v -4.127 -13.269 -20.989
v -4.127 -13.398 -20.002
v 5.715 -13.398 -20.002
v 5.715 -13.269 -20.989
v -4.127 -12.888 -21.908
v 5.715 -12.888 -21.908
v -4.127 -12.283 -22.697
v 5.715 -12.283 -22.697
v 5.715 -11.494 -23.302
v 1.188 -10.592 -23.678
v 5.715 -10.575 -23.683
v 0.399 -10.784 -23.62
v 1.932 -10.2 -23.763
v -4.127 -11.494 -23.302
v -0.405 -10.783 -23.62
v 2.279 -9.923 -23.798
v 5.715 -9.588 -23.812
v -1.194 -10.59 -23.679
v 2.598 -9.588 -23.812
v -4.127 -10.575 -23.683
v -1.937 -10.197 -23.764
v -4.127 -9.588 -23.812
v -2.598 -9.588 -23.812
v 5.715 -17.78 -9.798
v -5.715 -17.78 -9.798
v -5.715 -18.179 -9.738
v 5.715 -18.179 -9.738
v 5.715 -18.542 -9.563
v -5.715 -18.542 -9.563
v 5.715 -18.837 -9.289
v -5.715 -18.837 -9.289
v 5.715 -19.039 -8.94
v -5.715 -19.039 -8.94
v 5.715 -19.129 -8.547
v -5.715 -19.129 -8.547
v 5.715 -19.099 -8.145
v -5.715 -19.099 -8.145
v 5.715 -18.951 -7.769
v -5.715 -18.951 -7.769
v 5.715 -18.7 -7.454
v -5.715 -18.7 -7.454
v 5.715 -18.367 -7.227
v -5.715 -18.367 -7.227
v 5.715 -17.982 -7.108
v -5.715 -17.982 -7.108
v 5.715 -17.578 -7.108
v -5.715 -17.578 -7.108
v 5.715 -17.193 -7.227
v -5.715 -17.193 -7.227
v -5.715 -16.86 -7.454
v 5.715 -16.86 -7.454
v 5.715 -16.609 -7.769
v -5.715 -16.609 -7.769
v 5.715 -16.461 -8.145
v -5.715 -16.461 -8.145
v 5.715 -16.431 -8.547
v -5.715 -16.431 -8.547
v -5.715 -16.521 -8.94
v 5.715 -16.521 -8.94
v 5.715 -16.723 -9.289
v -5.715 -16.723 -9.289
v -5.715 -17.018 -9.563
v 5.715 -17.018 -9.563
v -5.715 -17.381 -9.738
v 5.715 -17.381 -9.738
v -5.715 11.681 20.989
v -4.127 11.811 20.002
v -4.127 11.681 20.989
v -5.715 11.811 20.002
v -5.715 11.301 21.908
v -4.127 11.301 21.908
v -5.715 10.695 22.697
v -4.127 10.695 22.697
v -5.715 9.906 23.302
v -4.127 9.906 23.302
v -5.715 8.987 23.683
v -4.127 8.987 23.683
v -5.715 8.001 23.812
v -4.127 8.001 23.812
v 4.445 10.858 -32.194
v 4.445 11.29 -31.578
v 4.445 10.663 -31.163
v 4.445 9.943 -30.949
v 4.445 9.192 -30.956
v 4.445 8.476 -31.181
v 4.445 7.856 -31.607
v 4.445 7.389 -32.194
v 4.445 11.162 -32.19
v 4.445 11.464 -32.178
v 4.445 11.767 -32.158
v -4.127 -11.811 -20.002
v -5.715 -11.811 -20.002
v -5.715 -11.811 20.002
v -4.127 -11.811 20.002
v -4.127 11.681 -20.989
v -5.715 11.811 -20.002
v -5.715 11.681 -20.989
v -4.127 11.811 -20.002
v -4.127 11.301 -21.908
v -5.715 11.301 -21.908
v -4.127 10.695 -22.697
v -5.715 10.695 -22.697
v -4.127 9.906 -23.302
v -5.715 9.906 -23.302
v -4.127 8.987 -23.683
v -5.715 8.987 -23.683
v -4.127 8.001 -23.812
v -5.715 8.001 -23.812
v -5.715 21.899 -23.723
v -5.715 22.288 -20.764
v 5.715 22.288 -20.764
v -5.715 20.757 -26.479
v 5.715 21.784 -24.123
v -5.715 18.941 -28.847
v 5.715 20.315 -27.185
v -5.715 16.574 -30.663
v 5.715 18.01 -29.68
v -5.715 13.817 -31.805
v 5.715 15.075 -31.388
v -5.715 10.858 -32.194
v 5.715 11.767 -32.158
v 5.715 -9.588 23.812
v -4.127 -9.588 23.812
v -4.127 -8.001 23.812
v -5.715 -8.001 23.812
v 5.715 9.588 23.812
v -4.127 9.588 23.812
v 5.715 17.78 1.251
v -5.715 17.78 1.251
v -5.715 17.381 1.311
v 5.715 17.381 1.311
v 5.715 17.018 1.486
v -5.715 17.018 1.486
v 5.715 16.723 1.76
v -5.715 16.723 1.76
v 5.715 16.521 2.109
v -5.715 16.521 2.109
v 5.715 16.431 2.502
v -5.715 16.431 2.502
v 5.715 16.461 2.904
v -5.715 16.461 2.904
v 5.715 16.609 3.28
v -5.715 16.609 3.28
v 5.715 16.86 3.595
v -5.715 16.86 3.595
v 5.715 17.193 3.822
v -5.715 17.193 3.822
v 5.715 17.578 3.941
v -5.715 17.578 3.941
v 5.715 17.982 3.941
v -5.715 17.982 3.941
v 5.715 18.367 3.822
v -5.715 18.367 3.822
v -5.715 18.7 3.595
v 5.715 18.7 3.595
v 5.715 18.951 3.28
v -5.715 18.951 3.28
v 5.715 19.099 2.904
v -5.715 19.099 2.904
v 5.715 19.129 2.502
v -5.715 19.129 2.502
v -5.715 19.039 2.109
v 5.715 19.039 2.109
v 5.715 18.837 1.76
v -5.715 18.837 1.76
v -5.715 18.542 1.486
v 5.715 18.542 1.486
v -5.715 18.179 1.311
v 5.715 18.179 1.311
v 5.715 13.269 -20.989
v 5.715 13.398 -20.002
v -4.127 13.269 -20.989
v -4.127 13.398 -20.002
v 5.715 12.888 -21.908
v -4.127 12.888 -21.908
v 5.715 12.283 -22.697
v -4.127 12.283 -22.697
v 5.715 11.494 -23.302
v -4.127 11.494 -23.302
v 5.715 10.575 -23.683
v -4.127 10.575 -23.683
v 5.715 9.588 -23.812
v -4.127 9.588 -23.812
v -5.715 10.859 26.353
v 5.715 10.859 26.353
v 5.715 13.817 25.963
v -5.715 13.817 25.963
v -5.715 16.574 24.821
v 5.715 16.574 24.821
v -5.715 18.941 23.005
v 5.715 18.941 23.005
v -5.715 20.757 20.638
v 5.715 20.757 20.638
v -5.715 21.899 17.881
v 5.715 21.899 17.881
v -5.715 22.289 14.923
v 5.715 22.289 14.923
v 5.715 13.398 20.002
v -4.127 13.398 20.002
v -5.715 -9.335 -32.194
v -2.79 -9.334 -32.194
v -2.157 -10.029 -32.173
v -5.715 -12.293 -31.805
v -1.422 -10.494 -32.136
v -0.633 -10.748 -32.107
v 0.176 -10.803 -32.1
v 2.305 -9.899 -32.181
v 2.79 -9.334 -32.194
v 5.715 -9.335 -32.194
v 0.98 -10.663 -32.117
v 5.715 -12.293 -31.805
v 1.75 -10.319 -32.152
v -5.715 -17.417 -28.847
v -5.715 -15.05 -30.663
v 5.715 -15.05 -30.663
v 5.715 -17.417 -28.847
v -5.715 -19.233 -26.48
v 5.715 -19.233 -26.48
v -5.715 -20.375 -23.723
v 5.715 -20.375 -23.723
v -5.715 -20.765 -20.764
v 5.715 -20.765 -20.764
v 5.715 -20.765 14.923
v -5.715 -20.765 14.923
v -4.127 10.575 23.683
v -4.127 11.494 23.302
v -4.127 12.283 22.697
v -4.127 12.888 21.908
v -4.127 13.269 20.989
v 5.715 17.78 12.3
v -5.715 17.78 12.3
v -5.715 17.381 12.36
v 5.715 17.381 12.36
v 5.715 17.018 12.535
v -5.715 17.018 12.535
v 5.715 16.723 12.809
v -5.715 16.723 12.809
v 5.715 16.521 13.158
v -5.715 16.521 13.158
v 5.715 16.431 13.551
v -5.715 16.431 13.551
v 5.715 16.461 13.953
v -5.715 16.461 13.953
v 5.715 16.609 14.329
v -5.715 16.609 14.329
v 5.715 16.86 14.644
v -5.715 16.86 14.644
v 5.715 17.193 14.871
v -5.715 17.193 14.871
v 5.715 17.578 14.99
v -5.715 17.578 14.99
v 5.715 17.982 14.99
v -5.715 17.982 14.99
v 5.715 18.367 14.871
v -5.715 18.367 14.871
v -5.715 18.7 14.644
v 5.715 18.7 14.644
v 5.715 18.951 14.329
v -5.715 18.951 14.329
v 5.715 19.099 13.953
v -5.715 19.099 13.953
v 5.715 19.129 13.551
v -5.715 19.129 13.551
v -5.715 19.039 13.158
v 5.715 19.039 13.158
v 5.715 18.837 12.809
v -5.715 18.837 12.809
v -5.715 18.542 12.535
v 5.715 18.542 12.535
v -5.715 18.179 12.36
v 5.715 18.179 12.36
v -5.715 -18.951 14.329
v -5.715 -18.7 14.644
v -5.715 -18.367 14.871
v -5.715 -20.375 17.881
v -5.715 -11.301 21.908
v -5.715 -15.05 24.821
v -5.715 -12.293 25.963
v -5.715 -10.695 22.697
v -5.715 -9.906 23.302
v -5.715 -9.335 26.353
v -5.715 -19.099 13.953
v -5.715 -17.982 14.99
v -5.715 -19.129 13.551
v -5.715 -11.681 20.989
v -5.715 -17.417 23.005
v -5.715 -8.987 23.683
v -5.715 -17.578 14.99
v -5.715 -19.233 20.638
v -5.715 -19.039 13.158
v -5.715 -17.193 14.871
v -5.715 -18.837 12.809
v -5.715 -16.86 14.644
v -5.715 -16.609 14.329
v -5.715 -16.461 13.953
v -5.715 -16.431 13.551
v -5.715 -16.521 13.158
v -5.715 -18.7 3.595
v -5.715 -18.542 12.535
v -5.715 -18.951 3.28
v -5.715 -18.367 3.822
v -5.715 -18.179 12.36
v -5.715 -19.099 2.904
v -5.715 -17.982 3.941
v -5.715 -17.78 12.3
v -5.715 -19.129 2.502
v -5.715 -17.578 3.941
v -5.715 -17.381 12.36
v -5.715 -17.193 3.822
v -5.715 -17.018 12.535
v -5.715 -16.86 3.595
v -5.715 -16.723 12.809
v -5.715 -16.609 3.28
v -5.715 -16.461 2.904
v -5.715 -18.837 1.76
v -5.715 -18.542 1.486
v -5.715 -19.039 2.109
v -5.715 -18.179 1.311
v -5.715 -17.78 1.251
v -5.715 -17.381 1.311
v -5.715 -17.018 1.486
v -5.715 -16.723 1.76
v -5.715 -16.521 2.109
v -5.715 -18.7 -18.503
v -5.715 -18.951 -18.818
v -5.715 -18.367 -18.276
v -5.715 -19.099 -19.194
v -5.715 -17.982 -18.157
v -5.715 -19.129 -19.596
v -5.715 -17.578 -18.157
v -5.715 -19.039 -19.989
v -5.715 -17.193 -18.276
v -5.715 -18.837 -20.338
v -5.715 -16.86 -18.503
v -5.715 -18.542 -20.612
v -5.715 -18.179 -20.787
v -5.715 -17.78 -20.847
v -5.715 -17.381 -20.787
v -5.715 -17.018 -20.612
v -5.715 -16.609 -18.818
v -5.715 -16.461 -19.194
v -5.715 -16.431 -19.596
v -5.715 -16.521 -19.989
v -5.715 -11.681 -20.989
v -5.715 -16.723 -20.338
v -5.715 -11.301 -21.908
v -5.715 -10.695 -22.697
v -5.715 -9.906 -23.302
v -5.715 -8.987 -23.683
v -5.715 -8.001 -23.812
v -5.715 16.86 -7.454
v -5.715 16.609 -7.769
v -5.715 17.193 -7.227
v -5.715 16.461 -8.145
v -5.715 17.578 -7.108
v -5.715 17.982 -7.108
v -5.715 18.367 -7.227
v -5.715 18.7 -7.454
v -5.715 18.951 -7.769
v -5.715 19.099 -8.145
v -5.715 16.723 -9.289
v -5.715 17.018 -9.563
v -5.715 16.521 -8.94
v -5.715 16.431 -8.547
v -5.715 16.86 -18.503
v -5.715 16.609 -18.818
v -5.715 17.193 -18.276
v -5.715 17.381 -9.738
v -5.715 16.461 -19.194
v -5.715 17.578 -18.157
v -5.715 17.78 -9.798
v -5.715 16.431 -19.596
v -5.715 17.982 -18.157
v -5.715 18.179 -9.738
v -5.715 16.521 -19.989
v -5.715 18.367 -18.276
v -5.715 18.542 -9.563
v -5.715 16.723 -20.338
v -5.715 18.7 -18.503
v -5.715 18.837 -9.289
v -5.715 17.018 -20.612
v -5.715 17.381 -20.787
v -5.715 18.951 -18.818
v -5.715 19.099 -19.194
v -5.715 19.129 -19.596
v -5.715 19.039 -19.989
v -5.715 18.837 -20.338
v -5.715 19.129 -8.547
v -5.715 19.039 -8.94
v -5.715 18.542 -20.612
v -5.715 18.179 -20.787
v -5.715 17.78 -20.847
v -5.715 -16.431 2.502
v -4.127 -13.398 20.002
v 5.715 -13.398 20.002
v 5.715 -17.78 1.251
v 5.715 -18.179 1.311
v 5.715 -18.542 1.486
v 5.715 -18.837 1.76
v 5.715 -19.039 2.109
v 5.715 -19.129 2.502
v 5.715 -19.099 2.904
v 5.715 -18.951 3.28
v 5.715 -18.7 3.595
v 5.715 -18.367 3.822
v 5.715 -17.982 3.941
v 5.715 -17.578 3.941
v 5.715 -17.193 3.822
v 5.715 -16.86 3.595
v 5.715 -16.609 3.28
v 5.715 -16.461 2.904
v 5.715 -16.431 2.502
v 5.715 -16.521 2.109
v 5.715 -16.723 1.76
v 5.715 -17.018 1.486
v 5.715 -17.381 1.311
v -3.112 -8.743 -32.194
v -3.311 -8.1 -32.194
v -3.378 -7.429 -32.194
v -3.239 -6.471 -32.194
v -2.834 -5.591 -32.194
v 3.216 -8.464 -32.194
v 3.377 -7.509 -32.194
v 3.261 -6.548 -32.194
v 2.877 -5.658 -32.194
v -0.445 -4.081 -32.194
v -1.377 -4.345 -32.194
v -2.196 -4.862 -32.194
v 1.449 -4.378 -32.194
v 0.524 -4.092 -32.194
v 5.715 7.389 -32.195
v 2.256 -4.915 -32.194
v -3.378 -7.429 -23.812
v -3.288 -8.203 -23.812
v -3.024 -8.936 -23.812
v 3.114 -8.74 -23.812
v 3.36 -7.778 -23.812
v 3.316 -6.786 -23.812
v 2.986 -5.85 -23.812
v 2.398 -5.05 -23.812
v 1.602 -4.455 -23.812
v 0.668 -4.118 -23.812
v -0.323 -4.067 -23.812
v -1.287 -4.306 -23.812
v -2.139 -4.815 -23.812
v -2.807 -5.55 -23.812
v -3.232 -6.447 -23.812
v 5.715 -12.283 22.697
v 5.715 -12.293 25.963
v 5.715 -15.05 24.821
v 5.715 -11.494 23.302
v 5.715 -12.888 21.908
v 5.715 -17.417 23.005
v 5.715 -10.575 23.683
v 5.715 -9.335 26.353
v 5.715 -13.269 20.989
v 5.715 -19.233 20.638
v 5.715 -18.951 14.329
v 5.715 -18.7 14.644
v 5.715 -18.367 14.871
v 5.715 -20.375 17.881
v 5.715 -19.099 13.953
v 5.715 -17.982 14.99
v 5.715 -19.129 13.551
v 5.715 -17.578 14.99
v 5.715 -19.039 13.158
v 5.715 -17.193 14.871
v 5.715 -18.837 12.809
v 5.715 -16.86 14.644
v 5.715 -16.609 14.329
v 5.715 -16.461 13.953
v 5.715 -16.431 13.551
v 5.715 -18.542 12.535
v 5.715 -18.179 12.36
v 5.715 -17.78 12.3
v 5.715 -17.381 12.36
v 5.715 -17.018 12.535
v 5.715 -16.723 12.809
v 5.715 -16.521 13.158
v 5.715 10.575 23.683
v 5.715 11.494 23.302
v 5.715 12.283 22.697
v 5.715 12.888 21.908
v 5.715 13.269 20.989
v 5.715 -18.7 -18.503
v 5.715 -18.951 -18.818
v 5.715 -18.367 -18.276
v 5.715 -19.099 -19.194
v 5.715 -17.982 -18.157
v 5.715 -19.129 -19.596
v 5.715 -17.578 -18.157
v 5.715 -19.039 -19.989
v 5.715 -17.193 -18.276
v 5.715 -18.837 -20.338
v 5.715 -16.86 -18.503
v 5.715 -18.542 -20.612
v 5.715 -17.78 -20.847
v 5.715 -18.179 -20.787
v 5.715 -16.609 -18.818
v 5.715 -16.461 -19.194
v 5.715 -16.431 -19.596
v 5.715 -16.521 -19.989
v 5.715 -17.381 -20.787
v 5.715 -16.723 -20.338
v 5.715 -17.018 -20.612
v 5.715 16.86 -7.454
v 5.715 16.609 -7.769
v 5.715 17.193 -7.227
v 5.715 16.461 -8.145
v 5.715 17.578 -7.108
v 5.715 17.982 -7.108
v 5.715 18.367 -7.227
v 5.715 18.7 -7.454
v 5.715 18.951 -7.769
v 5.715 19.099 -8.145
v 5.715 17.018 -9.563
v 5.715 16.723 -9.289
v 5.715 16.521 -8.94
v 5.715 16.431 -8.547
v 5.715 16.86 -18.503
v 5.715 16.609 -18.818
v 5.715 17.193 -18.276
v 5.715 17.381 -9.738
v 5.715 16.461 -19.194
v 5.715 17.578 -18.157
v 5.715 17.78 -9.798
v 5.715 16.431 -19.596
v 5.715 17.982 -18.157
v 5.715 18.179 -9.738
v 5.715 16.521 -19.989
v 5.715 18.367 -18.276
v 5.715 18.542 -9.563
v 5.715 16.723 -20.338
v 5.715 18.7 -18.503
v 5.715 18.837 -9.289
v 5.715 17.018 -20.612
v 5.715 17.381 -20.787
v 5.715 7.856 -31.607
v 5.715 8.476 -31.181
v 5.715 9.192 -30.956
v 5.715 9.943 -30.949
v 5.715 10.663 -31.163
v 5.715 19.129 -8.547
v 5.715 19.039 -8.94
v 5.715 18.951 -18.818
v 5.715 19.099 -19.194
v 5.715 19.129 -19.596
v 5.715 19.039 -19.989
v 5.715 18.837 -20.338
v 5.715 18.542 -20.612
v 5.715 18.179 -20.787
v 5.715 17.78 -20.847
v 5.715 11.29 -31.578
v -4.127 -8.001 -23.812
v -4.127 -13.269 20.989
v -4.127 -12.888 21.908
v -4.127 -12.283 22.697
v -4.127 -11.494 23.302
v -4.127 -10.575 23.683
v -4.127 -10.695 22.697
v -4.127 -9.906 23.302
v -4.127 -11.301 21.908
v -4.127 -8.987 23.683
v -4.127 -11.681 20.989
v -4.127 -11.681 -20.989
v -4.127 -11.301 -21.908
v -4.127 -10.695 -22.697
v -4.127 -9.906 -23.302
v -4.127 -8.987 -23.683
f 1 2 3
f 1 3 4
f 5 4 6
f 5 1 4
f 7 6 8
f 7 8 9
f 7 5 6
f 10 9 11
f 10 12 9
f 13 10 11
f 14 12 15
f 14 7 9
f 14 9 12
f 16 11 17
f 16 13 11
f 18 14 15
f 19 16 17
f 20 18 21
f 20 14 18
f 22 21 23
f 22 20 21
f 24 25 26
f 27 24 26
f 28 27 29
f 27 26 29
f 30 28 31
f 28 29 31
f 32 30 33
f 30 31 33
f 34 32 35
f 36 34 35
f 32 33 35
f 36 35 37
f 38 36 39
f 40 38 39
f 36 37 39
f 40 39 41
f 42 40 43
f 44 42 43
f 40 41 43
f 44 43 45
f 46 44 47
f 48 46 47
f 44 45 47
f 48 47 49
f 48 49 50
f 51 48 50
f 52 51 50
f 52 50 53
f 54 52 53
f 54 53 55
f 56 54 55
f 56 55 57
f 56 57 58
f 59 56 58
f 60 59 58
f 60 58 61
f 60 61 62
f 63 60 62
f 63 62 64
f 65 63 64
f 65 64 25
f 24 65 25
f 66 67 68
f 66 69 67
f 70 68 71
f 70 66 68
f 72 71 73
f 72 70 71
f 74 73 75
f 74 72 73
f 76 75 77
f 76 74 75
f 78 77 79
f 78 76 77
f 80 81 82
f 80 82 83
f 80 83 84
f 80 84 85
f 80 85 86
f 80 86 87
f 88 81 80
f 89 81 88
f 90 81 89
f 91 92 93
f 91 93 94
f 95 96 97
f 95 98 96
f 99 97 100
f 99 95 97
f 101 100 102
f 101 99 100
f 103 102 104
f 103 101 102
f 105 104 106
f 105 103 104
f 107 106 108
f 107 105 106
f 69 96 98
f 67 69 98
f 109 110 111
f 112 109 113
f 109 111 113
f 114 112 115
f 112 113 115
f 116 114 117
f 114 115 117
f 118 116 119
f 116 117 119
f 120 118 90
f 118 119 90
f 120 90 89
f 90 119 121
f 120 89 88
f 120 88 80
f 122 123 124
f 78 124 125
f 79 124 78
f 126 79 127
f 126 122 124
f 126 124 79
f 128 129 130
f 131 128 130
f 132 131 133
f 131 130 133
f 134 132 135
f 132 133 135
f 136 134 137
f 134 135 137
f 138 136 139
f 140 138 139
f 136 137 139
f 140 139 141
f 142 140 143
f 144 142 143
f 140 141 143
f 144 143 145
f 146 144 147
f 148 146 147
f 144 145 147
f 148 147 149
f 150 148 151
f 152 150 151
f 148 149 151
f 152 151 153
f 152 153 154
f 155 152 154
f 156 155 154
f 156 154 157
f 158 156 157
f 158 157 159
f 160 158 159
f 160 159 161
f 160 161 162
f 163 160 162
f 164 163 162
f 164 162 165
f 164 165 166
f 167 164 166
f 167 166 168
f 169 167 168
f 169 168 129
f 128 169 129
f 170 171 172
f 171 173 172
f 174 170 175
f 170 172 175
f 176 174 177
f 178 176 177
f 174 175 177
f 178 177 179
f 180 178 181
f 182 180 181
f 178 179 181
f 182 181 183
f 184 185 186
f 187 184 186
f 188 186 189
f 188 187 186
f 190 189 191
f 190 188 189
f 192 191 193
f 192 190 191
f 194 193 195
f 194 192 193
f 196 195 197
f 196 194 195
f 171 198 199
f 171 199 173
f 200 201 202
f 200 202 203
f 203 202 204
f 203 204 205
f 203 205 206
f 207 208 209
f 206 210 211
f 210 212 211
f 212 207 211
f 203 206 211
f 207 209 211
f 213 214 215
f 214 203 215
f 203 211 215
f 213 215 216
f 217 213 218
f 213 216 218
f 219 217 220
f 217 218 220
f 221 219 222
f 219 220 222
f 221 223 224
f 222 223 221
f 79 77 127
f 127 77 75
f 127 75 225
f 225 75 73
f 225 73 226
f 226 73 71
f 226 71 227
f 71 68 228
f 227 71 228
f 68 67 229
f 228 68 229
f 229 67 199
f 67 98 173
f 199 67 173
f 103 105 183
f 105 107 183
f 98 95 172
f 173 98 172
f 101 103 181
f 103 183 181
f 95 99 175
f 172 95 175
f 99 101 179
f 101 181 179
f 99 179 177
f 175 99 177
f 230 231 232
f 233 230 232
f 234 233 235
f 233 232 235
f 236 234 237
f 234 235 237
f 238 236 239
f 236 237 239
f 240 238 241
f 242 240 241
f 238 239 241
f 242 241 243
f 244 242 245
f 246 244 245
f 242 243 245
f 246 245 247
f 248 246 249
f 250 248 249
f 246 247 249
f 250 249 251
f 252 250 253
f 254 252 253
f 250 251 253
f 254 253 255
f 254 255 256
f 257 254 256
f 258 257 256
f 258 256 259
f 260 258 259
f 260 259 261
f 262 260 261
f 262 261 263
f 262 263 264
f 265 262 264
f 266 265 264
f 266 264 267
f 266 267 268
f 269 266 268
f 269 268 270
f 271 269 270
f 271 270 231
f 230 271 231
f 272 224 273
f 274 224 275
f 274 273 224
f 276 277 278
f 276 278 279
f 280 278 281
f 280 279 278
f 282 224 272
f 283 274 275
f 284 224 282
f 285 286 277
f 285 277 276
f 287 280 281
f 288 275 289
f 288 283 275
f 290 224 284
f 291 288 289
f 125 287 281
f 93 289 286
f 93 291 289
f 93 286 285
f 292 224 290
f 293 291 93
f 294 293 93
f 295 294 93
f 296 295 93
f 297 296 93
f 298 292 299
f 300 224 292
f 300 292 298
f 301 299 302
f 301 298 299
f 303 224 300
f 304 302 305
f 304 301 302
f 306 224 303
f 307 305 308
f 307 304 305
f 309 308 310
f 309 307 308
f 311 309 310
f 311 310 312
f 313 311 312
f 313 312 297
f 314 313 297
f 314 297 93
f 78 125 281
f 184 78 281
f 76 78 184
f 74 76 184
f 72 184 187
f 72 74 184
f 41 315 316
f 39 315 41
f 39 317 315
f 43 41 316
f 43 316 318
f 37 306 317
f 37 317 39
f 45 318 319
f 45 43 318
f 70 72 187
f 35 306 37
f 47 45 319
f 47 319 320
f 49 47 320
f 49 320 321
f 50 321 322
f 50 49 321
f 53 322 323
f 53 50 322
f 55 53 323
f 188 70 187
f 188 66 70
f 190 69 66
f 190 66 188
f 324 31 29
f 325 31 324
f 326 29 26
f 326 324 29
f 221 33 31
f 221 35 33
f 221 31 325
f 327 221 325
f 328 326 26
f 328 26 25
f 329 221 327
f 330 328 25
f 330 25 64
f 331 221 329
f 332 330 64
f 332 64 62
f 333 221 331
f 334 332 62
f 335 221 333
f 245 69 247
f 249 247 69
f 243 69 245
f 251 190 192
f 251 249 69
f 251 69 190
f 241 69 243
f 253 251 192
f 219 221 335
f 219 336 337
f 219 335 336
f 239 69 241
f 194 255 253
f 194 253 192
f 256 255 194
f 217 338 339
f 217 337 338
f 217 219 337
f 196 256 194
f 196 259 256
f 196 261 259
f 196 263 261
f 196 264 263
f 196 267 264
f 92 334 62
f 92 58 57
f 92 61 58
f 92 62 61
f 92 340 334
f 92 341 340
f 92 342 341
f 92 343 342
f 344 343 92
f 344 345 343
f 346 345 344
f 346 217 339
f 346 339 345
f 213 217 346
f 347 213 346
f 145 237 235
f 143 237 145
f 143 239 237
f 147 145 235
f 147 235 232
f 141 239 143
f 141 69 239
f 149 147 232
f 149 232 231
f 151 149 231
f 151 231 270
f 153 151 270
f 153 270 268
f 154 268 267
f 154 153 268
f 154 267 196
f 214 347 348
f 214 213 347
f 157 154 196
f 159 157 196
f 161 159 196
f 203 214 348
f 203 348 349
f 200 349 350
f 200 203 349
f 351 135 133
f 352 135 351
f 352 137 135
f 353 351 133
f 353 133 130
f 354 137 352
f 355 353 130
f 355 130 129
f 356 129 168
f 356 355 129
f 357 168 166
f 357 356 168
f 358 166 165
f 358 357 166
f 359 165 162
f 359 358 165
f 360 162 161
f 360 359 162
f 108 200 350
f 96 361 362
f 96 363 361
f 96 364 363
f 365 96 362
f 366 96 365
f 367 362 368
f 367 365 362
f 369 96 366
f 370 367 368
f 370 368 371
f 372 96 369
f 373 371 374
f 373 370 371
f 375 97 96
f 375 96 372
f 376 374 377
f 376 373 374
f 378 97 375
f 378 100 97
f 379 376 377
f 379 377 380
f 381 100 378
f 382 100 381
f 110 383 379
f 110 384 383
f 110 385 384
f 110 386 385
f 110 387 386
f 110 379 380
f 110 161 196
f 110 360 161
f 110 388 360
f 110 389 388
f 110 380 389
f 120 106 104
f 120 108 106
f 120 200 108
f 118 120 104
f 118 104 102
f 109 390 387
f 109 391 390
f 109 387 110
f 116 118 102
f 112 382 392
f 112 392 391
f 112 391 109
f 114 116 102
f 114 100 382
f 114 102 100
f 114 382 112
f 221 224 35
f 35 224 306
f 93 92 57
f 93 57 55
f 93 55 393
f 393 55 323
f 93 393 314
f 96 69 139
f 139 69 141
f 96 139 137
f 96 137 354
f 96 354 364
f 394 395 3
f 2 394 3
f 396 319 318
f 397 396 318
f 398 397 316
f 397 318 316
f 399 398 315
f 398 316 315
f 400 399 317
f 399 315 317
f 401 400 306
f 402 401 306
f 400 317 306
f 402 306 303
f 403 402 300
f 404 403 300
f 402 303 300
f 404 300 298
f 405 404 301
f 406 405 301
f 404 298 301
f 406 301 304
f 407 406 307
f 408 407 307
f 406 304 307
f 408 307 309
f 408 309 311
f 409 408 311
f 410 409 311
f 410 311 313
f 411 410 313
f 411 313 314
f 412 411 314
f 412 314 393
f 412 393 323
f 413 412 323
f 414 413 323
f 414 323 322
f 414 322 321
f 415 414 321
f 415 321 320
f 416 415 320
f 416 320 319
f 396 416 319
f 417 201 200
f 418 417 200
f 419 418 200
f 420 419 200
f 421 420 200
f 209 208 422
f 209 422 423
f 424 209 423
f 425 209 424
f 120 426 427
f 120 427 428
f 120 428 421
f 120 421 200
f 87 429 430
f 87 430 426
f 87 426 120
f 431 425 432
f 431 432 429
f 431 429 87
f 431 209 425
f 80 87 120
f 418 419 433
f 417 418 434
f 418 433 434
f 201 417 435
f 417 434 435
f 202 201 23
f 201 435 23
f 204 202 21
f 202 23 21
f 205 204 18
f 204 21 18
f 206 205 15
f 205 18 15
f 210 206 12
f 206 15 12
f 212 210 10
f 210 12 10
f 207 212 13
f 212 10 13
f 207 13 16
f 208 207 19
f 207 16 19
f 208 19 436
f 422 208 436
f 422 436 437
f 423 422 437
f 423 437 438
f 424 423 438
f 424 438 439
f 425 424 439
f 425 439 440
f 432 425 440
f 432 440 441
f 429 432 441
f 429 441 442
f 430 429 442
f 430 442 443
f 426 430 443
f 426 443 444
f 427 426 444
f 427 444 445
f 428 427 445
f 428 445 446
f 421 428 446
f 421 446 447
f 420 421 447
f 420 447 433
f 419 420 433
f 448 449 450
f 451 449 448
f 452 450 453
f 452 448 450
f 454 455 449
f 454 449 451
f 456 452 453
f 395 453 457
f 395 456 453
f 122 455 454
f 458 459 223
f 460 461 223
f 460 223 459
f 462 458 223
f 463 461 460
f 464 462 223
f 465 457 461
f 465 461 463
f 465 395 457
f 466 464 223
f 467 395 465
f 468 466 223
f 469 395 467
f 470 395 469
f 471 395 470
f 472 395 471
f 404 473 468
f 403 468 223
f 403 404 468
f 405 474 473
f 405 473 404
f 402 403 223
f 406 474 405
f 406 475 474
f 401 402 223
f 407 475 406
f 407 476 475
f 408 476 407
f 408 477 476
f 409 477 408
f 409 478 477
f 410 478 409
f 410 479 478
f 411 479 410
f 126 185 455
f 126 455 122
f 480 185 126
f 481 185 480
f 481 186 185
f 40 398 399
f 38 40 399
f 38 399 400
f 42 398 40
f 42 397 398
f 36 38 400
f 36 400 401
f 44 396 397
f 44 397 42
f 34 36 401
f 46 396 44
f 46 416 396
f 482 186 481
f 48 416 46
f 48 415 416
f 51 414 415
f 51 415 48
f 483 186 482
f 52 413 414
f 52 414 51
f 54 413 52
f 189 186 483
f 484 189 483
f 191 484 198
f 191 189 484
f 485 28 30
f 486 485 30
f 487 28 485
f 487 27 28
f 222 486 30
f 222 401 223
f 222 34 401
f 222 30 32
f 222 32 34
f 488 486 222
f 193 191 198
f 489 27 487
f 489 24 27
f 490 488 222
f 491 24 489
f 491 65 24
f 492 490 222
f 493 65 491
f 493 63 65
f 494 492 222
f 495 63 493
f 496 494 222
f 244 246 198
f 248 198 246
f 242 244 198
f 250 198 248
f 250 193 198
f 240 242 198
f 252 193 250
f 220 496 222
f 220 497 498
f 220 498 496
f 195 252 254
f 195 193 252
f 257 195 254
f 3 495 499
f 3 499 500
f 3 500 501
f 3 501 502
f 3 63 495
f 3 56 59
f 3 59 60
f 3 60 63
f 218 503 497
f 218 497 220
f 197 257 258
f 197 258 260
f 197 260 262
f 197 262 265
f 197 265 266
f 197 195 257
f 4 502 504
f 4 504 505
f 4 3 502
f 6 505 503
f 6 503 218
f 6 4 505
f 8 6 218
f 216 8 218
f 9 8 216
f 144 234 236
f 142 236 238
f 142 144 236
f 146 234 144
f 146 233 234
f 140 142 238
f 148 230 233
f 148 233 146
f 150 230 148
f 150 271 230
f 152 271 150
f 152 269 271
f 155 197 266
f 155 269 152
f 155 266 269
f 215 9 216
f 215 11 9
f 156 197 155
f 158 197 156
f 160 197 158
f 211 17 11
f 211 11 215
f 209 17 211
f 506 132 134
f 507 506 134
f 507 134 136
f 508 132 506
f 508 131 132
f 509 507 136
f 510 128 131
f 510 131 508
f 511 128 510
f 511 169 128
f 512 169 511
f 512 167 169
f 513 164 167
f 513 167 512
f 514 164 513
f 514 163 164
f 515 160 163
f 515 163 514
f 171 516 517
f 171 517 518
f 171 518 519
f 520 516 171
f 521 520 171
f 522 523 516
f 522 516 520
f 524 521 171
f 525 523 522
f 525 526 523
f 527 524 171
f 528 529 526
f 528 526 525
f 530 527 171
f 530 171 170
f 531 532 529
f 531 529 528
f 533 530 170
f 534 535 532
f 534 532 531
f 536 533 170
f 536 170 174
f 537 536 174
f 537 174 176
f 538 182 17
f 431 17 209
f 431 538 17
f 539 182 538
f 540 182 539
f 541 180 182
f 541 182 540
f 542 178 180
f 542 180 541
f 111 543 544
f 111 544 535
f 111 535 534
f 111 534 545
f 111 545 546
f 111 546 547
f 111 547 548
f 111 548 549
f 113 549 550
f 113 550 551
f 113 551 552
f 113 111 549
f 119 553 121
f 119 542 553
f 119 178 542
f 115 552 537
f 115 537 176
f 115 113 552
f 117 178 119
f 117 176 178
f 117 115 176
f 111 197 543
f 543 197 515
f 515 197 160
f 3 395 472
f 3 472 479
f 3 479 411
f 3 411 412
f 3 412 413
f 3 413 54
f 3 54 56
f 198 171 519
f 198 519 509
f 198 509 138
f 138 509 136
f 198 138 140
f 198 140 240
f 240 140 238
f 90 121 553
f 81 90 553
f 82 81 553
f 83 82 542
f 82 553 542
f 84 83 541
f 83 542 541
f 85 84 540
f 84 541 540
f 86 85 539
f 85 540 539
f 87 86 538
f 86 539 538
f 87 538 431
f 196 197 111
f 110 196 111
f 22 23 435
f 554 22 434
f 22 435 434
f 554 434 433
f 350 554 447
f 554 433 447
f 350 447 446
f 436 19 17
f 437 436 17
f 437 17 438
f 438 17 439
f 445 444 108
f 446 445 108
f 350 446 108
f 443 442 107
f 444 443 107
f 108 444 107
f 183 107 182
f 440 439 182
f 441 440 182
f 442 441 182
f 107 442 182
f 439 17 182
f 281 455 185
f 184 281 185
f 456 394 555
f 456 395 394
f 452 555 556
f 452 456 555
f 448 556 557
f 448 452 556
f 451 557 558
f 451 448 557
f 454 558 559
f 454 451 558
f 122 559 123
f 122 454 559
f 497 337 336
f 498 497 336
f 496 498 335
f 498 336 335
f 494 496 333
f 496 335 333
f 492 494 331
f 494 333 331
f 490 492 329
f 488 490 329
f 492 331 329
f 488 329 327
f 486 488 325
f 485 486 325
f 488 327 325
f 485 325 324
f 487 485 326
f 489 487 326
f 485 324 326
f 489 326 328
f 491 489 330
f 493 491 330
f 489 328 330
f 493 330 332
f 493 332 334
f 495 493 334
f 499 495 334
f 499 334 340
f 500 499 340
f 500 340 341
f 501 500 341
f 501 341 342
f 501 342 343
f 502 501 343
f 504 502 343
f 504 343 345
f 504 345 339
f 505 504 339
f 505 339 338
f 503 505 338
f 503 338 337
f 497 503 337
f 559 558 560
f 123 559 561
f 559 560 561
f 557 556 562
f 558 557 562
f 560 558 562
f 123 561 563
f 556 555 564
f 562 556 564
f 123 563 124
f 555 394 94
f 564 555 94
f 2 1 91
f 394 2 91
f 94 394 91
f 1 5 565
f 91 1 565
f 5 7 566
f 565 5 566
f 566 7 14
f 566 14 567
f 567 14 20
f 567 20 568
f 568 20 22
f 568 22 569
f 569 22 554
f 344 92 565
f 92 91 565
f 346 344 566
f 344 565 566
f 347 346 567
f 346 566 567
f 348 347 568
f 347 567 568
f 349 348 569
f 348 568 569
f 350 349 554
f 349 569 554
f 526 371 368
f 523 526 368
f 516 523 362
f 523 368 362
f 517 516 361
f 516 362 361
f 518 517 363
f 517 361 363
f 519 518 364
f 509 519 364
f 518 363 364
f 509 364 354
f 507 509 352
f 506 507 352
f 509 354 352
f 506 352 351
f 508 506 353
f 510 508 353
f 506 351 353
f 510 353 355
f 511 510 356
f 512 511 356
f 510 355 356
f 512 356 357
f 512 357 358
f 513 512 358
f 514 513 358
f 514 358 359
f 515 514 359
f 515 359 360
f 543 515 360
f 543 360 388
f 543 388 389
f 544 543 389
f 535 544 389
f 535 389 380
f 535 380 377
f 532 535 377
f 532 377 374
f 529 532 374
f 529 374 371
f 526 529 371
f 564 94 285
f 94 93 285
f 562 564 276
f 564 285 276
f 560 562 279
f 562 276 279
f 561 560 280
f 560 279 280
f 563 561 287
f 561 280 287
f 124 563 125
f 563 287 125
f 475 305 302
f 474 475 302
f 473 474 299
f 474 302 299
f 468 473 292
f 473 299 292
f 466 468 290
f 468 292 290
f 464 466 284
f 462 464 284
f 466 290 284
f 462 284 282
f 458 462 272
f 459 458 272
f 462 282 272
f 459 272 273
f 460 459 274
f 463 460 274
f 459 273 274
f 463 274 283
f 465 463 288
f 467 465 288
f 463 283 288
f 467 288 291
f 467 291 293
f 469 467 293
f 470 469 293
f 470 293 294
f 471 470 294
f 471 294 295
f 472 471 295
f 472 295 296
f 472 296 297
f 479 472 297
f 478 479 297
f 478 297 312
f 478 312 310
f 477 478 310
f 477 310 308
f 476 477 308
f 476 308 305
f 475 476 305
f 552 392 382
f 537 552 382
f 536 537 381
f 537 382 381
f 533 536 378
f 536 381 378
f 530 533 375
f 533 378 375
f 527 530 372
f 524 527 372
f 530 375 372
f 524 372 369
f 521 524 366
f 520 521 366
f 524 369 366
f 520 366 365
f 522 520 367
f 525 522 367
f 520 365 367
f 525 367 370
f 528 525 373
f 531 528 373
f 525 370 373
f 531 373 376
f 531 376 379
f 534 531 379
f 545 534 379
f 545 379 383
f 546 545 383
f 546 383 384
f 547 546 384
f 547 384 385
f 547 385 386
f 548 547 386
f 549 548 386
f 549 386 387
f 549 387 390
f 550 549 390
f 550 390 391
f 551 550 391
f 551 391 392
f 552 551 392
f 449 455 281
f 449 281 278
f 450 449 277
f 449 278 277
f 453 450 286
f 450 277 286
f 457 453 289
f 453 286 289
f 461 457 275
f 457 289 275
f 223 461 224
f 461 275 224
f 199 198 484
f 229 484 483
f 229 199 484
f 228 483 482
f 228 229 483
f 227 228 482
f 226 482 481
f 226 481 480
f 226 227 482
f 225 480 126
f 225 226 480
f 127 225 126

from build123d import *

# Parameters (mm, degrees)
SKETCH1_W                   = 58.547
SKETCH1_H                   = 44.577
SKETCH1_W_2                 = 47.625
SKETCH1_H_2                 = 26.797
BOSS_EXTRUDE1_DEPTH         = 5.715
BOSS_EXTRUDE2_REACH         = 57.19
SKETCH9_W                   = 1.5875
SKETCH9_H                   = 1.5875
FILLET11_R                  = 3.81
FILLET12_R                  = 3.81
SKETCH21_R                  = 2.54
CUT_EXTRUDE3_DEPTH          = 1.27
F_1_4_CLEARANCE_HOLE1_D     = 6.7564
F_1_4_CLEARANCE_HOLE1_DEPTH = 8.89
F_1_4_CLEARANCE_HOLE1_TIP   = 2.029827343
F_6_32_TAPPED_HOLE1_D       = 2.7051
SKETCH22_W                  = 58.547
SKETCH22_H                  = 7.441182991
CUT_EXTRUDE4_DEPTH          = 41.791028045
FILLET13_R                  = 11.43
FILLET14_R                  = 11.43


with BuildPart() as part:
    # Sketch1 → Boss-Extrude1 (new, symmetric)
    with BuildSketch(Plane(origin=(0, 0, 0), x_dir=(0, 0, -1), z_dir=(1, 0, 0))):
        with Locations((2.921, 0)):
            Rectangle(SKETCH1_W, SKETCH1_H)
        Rectangle(SKETCH1_W_2, SKETCH1_H_2, mode=Mode.SUBTRACT)
    extrude(amount=BOSS_EXTRUDE1_DEPTH, both=True)

    # Sketch9 → Boss-Extrude2 (add, up to next)
    with BuildSketch(Plane.XY.offset(-23.8125), mode=Mode.PRIVATE) as boss_extrude2_sk1:
        with Locations((-4.92125, 12.60475)):
            Rectangle(SKETCH9_W, SKETCH9_H)
    boss_extrude2_tool1 = extrude(boss_extrude2_sk1.sketch, amount=BOSS_EXTRUDE2_REACH, mode=Mode.PRIVATE) - part.part
    # Sketch9 → Boss-Extrude2 (add, up to next)
    with BuildSketch(Plane.XY.offset(-23.8125), mode=Mode.PRIVATE) as boss_extrude2_sk2:
        with Locations((-4.92125, -12.60475)):
            Rectangle(SKETCH9_W, SKETCH9_H)
    boss_extrude2_tool2 = extrude(boss_extrude2_sk2.sketch, amount=BOSS_EXTRUDE2_REACH, mode=Mode.PRIVATE) - part.part
    add(boss_extrude2_tool1.solids().sort_by_distance((-4.92125, 12.60475, -23.8125))[0])
    add(boss_extrude2_tool2.solids().sort_by_distance((-4.92125, -12.60475, -23.8125))[0])

    # Fillet11
    fillet11_edges = [part.edges().sort_by_distance(p)[0] for p in [
        (-4.92125, -11.811, 23.8125),
        (-4.92125, -11.811, -23.8125),
        (-4.92125, 11.811, 23.8125),
        (-4.92125, 11.811, -23.8125),
    ]]
    fillet(fillet11_edges, radius=FILLET11_R)

    # Fillet12
    fillet12_edges = [part.edges().sort_by_distance(p)[0] for p in [
        (0.79375, 13.3985, 23.8125),
        (0.79375, -13.3985, 23.8125),
        (0.79375, -13.3985, -23.8125),
        (0.79375, 13.3985, -23.8125),
    ]]
    fillet(fillet12_edges, radius=FILLET12_R)

    # Sketch21 → Cut-Extrude3 (cut)
    with BuildSketch(Plane(origin=(5.715, 0, 0), x_dir=(0, 0, -1), z_dir=(1, 0, 0))):
        with Locations((33.4645, 9.5885)):
            Circle(SKETCH21_R)
    extrude(amount=-CUT_EXTRUDE3_DEPTH, mode=Mode.SUBTRACT)

    # 1/4 Clearance Hole1
    with Locations(Plane(origin=(-2.530789808, 6.493019647, -32.1945), x_dir=(1, 0, 0), z_dir=(0, 0, -1))):
        with Locations((2.530789808, 13.922519647)):
            Hole(F_1_4_CLEARANCE_HOLE1_D / 2, depth=F_1_4_CLEARANCE_HOLE1_DEPTH)
            with Locations((0, 0, -(F_1_4_CLEARANCE_HOLE1_DEPTH + F_1_4_CLEARANCE_HOLE1_TIP / 2))):  # 118° drill point
                Cone(0, F_1_4_CLEARANCE_HOLE1_D / 2, F_1_4_CLEARANCE_HOLE1_TIP, mode=Mode.SUBTRACT)

    # #6-32 Tapped Hole1 (through all)
    with Locations(Plane(origin=(5.715, 17.955600219, 19.212274833), x_dir=(0, 0, 1), z_dir=(1, 0, 0))):
        with Locations((-27.657774833, 0.175600219), (-16.608774833, 0.175600219), (-5.559774833, 0.175600219), (-38.706774833, 0.175600219), (-38.706774833, 35.735600219), (-27.657774833, 35.735600219), (-16.608774833, 35.735600219), (-5.559774833, 35.735600219)):
            Hole(F_6_32_TAPPED_HOLE1_D / 2)

    # Sketch22 → Cut-Extrude4 (cut, through all)
    with BuildSketch(Plane(origin=(5.715, 0, 0), x_dir=(0, 0, -1), z_dir=(1, 0, 0))):
        with Locations((2.921, -24.485091496)):
            Rectangle(SKETCH22_W, SKETCH22_H)
    extrude(amount=-CUT_EXTRUDE4_DEPTH, mode=Mode.SUBTRACT)

    # Fillet13
    # the kernel refuses this fillet: 11.43 mm, written as the material it takes off along each edge
    with BuildSketch(Plane(origin=(34.29, 22.2885, -32.1945), x_dir=(0, -1, 0), z_dir=(-1, 0, 0)), Plane(origin=(34.29, -20.7645, -32.1945), x_dir=(0, 0, 1), z_dir=(-1, 0, 0))) as fillet13_piece_1:
        with BuildLine():
            CenterArc((FILLET13_R, FILLET13_R), FILLET13_R, 180, 90)
            Line((0, FILLET13_R), (0, 0))
            Line((0, 0), (FILLET13_R, 0))
        make_face()
    extrude(amount=68.58, mode=Mode.SUBTRACT)

    # Fillet14
    fillet14_edges = [part.edges().sort_by_distance(p)[0] for p in [
        (0, -20.7645, 26.3525),
        (0, 22.2885, 26.3525),
    ]]
    fillet(fillet14_edges, radius=FILLET14_R)


solid = part.part
